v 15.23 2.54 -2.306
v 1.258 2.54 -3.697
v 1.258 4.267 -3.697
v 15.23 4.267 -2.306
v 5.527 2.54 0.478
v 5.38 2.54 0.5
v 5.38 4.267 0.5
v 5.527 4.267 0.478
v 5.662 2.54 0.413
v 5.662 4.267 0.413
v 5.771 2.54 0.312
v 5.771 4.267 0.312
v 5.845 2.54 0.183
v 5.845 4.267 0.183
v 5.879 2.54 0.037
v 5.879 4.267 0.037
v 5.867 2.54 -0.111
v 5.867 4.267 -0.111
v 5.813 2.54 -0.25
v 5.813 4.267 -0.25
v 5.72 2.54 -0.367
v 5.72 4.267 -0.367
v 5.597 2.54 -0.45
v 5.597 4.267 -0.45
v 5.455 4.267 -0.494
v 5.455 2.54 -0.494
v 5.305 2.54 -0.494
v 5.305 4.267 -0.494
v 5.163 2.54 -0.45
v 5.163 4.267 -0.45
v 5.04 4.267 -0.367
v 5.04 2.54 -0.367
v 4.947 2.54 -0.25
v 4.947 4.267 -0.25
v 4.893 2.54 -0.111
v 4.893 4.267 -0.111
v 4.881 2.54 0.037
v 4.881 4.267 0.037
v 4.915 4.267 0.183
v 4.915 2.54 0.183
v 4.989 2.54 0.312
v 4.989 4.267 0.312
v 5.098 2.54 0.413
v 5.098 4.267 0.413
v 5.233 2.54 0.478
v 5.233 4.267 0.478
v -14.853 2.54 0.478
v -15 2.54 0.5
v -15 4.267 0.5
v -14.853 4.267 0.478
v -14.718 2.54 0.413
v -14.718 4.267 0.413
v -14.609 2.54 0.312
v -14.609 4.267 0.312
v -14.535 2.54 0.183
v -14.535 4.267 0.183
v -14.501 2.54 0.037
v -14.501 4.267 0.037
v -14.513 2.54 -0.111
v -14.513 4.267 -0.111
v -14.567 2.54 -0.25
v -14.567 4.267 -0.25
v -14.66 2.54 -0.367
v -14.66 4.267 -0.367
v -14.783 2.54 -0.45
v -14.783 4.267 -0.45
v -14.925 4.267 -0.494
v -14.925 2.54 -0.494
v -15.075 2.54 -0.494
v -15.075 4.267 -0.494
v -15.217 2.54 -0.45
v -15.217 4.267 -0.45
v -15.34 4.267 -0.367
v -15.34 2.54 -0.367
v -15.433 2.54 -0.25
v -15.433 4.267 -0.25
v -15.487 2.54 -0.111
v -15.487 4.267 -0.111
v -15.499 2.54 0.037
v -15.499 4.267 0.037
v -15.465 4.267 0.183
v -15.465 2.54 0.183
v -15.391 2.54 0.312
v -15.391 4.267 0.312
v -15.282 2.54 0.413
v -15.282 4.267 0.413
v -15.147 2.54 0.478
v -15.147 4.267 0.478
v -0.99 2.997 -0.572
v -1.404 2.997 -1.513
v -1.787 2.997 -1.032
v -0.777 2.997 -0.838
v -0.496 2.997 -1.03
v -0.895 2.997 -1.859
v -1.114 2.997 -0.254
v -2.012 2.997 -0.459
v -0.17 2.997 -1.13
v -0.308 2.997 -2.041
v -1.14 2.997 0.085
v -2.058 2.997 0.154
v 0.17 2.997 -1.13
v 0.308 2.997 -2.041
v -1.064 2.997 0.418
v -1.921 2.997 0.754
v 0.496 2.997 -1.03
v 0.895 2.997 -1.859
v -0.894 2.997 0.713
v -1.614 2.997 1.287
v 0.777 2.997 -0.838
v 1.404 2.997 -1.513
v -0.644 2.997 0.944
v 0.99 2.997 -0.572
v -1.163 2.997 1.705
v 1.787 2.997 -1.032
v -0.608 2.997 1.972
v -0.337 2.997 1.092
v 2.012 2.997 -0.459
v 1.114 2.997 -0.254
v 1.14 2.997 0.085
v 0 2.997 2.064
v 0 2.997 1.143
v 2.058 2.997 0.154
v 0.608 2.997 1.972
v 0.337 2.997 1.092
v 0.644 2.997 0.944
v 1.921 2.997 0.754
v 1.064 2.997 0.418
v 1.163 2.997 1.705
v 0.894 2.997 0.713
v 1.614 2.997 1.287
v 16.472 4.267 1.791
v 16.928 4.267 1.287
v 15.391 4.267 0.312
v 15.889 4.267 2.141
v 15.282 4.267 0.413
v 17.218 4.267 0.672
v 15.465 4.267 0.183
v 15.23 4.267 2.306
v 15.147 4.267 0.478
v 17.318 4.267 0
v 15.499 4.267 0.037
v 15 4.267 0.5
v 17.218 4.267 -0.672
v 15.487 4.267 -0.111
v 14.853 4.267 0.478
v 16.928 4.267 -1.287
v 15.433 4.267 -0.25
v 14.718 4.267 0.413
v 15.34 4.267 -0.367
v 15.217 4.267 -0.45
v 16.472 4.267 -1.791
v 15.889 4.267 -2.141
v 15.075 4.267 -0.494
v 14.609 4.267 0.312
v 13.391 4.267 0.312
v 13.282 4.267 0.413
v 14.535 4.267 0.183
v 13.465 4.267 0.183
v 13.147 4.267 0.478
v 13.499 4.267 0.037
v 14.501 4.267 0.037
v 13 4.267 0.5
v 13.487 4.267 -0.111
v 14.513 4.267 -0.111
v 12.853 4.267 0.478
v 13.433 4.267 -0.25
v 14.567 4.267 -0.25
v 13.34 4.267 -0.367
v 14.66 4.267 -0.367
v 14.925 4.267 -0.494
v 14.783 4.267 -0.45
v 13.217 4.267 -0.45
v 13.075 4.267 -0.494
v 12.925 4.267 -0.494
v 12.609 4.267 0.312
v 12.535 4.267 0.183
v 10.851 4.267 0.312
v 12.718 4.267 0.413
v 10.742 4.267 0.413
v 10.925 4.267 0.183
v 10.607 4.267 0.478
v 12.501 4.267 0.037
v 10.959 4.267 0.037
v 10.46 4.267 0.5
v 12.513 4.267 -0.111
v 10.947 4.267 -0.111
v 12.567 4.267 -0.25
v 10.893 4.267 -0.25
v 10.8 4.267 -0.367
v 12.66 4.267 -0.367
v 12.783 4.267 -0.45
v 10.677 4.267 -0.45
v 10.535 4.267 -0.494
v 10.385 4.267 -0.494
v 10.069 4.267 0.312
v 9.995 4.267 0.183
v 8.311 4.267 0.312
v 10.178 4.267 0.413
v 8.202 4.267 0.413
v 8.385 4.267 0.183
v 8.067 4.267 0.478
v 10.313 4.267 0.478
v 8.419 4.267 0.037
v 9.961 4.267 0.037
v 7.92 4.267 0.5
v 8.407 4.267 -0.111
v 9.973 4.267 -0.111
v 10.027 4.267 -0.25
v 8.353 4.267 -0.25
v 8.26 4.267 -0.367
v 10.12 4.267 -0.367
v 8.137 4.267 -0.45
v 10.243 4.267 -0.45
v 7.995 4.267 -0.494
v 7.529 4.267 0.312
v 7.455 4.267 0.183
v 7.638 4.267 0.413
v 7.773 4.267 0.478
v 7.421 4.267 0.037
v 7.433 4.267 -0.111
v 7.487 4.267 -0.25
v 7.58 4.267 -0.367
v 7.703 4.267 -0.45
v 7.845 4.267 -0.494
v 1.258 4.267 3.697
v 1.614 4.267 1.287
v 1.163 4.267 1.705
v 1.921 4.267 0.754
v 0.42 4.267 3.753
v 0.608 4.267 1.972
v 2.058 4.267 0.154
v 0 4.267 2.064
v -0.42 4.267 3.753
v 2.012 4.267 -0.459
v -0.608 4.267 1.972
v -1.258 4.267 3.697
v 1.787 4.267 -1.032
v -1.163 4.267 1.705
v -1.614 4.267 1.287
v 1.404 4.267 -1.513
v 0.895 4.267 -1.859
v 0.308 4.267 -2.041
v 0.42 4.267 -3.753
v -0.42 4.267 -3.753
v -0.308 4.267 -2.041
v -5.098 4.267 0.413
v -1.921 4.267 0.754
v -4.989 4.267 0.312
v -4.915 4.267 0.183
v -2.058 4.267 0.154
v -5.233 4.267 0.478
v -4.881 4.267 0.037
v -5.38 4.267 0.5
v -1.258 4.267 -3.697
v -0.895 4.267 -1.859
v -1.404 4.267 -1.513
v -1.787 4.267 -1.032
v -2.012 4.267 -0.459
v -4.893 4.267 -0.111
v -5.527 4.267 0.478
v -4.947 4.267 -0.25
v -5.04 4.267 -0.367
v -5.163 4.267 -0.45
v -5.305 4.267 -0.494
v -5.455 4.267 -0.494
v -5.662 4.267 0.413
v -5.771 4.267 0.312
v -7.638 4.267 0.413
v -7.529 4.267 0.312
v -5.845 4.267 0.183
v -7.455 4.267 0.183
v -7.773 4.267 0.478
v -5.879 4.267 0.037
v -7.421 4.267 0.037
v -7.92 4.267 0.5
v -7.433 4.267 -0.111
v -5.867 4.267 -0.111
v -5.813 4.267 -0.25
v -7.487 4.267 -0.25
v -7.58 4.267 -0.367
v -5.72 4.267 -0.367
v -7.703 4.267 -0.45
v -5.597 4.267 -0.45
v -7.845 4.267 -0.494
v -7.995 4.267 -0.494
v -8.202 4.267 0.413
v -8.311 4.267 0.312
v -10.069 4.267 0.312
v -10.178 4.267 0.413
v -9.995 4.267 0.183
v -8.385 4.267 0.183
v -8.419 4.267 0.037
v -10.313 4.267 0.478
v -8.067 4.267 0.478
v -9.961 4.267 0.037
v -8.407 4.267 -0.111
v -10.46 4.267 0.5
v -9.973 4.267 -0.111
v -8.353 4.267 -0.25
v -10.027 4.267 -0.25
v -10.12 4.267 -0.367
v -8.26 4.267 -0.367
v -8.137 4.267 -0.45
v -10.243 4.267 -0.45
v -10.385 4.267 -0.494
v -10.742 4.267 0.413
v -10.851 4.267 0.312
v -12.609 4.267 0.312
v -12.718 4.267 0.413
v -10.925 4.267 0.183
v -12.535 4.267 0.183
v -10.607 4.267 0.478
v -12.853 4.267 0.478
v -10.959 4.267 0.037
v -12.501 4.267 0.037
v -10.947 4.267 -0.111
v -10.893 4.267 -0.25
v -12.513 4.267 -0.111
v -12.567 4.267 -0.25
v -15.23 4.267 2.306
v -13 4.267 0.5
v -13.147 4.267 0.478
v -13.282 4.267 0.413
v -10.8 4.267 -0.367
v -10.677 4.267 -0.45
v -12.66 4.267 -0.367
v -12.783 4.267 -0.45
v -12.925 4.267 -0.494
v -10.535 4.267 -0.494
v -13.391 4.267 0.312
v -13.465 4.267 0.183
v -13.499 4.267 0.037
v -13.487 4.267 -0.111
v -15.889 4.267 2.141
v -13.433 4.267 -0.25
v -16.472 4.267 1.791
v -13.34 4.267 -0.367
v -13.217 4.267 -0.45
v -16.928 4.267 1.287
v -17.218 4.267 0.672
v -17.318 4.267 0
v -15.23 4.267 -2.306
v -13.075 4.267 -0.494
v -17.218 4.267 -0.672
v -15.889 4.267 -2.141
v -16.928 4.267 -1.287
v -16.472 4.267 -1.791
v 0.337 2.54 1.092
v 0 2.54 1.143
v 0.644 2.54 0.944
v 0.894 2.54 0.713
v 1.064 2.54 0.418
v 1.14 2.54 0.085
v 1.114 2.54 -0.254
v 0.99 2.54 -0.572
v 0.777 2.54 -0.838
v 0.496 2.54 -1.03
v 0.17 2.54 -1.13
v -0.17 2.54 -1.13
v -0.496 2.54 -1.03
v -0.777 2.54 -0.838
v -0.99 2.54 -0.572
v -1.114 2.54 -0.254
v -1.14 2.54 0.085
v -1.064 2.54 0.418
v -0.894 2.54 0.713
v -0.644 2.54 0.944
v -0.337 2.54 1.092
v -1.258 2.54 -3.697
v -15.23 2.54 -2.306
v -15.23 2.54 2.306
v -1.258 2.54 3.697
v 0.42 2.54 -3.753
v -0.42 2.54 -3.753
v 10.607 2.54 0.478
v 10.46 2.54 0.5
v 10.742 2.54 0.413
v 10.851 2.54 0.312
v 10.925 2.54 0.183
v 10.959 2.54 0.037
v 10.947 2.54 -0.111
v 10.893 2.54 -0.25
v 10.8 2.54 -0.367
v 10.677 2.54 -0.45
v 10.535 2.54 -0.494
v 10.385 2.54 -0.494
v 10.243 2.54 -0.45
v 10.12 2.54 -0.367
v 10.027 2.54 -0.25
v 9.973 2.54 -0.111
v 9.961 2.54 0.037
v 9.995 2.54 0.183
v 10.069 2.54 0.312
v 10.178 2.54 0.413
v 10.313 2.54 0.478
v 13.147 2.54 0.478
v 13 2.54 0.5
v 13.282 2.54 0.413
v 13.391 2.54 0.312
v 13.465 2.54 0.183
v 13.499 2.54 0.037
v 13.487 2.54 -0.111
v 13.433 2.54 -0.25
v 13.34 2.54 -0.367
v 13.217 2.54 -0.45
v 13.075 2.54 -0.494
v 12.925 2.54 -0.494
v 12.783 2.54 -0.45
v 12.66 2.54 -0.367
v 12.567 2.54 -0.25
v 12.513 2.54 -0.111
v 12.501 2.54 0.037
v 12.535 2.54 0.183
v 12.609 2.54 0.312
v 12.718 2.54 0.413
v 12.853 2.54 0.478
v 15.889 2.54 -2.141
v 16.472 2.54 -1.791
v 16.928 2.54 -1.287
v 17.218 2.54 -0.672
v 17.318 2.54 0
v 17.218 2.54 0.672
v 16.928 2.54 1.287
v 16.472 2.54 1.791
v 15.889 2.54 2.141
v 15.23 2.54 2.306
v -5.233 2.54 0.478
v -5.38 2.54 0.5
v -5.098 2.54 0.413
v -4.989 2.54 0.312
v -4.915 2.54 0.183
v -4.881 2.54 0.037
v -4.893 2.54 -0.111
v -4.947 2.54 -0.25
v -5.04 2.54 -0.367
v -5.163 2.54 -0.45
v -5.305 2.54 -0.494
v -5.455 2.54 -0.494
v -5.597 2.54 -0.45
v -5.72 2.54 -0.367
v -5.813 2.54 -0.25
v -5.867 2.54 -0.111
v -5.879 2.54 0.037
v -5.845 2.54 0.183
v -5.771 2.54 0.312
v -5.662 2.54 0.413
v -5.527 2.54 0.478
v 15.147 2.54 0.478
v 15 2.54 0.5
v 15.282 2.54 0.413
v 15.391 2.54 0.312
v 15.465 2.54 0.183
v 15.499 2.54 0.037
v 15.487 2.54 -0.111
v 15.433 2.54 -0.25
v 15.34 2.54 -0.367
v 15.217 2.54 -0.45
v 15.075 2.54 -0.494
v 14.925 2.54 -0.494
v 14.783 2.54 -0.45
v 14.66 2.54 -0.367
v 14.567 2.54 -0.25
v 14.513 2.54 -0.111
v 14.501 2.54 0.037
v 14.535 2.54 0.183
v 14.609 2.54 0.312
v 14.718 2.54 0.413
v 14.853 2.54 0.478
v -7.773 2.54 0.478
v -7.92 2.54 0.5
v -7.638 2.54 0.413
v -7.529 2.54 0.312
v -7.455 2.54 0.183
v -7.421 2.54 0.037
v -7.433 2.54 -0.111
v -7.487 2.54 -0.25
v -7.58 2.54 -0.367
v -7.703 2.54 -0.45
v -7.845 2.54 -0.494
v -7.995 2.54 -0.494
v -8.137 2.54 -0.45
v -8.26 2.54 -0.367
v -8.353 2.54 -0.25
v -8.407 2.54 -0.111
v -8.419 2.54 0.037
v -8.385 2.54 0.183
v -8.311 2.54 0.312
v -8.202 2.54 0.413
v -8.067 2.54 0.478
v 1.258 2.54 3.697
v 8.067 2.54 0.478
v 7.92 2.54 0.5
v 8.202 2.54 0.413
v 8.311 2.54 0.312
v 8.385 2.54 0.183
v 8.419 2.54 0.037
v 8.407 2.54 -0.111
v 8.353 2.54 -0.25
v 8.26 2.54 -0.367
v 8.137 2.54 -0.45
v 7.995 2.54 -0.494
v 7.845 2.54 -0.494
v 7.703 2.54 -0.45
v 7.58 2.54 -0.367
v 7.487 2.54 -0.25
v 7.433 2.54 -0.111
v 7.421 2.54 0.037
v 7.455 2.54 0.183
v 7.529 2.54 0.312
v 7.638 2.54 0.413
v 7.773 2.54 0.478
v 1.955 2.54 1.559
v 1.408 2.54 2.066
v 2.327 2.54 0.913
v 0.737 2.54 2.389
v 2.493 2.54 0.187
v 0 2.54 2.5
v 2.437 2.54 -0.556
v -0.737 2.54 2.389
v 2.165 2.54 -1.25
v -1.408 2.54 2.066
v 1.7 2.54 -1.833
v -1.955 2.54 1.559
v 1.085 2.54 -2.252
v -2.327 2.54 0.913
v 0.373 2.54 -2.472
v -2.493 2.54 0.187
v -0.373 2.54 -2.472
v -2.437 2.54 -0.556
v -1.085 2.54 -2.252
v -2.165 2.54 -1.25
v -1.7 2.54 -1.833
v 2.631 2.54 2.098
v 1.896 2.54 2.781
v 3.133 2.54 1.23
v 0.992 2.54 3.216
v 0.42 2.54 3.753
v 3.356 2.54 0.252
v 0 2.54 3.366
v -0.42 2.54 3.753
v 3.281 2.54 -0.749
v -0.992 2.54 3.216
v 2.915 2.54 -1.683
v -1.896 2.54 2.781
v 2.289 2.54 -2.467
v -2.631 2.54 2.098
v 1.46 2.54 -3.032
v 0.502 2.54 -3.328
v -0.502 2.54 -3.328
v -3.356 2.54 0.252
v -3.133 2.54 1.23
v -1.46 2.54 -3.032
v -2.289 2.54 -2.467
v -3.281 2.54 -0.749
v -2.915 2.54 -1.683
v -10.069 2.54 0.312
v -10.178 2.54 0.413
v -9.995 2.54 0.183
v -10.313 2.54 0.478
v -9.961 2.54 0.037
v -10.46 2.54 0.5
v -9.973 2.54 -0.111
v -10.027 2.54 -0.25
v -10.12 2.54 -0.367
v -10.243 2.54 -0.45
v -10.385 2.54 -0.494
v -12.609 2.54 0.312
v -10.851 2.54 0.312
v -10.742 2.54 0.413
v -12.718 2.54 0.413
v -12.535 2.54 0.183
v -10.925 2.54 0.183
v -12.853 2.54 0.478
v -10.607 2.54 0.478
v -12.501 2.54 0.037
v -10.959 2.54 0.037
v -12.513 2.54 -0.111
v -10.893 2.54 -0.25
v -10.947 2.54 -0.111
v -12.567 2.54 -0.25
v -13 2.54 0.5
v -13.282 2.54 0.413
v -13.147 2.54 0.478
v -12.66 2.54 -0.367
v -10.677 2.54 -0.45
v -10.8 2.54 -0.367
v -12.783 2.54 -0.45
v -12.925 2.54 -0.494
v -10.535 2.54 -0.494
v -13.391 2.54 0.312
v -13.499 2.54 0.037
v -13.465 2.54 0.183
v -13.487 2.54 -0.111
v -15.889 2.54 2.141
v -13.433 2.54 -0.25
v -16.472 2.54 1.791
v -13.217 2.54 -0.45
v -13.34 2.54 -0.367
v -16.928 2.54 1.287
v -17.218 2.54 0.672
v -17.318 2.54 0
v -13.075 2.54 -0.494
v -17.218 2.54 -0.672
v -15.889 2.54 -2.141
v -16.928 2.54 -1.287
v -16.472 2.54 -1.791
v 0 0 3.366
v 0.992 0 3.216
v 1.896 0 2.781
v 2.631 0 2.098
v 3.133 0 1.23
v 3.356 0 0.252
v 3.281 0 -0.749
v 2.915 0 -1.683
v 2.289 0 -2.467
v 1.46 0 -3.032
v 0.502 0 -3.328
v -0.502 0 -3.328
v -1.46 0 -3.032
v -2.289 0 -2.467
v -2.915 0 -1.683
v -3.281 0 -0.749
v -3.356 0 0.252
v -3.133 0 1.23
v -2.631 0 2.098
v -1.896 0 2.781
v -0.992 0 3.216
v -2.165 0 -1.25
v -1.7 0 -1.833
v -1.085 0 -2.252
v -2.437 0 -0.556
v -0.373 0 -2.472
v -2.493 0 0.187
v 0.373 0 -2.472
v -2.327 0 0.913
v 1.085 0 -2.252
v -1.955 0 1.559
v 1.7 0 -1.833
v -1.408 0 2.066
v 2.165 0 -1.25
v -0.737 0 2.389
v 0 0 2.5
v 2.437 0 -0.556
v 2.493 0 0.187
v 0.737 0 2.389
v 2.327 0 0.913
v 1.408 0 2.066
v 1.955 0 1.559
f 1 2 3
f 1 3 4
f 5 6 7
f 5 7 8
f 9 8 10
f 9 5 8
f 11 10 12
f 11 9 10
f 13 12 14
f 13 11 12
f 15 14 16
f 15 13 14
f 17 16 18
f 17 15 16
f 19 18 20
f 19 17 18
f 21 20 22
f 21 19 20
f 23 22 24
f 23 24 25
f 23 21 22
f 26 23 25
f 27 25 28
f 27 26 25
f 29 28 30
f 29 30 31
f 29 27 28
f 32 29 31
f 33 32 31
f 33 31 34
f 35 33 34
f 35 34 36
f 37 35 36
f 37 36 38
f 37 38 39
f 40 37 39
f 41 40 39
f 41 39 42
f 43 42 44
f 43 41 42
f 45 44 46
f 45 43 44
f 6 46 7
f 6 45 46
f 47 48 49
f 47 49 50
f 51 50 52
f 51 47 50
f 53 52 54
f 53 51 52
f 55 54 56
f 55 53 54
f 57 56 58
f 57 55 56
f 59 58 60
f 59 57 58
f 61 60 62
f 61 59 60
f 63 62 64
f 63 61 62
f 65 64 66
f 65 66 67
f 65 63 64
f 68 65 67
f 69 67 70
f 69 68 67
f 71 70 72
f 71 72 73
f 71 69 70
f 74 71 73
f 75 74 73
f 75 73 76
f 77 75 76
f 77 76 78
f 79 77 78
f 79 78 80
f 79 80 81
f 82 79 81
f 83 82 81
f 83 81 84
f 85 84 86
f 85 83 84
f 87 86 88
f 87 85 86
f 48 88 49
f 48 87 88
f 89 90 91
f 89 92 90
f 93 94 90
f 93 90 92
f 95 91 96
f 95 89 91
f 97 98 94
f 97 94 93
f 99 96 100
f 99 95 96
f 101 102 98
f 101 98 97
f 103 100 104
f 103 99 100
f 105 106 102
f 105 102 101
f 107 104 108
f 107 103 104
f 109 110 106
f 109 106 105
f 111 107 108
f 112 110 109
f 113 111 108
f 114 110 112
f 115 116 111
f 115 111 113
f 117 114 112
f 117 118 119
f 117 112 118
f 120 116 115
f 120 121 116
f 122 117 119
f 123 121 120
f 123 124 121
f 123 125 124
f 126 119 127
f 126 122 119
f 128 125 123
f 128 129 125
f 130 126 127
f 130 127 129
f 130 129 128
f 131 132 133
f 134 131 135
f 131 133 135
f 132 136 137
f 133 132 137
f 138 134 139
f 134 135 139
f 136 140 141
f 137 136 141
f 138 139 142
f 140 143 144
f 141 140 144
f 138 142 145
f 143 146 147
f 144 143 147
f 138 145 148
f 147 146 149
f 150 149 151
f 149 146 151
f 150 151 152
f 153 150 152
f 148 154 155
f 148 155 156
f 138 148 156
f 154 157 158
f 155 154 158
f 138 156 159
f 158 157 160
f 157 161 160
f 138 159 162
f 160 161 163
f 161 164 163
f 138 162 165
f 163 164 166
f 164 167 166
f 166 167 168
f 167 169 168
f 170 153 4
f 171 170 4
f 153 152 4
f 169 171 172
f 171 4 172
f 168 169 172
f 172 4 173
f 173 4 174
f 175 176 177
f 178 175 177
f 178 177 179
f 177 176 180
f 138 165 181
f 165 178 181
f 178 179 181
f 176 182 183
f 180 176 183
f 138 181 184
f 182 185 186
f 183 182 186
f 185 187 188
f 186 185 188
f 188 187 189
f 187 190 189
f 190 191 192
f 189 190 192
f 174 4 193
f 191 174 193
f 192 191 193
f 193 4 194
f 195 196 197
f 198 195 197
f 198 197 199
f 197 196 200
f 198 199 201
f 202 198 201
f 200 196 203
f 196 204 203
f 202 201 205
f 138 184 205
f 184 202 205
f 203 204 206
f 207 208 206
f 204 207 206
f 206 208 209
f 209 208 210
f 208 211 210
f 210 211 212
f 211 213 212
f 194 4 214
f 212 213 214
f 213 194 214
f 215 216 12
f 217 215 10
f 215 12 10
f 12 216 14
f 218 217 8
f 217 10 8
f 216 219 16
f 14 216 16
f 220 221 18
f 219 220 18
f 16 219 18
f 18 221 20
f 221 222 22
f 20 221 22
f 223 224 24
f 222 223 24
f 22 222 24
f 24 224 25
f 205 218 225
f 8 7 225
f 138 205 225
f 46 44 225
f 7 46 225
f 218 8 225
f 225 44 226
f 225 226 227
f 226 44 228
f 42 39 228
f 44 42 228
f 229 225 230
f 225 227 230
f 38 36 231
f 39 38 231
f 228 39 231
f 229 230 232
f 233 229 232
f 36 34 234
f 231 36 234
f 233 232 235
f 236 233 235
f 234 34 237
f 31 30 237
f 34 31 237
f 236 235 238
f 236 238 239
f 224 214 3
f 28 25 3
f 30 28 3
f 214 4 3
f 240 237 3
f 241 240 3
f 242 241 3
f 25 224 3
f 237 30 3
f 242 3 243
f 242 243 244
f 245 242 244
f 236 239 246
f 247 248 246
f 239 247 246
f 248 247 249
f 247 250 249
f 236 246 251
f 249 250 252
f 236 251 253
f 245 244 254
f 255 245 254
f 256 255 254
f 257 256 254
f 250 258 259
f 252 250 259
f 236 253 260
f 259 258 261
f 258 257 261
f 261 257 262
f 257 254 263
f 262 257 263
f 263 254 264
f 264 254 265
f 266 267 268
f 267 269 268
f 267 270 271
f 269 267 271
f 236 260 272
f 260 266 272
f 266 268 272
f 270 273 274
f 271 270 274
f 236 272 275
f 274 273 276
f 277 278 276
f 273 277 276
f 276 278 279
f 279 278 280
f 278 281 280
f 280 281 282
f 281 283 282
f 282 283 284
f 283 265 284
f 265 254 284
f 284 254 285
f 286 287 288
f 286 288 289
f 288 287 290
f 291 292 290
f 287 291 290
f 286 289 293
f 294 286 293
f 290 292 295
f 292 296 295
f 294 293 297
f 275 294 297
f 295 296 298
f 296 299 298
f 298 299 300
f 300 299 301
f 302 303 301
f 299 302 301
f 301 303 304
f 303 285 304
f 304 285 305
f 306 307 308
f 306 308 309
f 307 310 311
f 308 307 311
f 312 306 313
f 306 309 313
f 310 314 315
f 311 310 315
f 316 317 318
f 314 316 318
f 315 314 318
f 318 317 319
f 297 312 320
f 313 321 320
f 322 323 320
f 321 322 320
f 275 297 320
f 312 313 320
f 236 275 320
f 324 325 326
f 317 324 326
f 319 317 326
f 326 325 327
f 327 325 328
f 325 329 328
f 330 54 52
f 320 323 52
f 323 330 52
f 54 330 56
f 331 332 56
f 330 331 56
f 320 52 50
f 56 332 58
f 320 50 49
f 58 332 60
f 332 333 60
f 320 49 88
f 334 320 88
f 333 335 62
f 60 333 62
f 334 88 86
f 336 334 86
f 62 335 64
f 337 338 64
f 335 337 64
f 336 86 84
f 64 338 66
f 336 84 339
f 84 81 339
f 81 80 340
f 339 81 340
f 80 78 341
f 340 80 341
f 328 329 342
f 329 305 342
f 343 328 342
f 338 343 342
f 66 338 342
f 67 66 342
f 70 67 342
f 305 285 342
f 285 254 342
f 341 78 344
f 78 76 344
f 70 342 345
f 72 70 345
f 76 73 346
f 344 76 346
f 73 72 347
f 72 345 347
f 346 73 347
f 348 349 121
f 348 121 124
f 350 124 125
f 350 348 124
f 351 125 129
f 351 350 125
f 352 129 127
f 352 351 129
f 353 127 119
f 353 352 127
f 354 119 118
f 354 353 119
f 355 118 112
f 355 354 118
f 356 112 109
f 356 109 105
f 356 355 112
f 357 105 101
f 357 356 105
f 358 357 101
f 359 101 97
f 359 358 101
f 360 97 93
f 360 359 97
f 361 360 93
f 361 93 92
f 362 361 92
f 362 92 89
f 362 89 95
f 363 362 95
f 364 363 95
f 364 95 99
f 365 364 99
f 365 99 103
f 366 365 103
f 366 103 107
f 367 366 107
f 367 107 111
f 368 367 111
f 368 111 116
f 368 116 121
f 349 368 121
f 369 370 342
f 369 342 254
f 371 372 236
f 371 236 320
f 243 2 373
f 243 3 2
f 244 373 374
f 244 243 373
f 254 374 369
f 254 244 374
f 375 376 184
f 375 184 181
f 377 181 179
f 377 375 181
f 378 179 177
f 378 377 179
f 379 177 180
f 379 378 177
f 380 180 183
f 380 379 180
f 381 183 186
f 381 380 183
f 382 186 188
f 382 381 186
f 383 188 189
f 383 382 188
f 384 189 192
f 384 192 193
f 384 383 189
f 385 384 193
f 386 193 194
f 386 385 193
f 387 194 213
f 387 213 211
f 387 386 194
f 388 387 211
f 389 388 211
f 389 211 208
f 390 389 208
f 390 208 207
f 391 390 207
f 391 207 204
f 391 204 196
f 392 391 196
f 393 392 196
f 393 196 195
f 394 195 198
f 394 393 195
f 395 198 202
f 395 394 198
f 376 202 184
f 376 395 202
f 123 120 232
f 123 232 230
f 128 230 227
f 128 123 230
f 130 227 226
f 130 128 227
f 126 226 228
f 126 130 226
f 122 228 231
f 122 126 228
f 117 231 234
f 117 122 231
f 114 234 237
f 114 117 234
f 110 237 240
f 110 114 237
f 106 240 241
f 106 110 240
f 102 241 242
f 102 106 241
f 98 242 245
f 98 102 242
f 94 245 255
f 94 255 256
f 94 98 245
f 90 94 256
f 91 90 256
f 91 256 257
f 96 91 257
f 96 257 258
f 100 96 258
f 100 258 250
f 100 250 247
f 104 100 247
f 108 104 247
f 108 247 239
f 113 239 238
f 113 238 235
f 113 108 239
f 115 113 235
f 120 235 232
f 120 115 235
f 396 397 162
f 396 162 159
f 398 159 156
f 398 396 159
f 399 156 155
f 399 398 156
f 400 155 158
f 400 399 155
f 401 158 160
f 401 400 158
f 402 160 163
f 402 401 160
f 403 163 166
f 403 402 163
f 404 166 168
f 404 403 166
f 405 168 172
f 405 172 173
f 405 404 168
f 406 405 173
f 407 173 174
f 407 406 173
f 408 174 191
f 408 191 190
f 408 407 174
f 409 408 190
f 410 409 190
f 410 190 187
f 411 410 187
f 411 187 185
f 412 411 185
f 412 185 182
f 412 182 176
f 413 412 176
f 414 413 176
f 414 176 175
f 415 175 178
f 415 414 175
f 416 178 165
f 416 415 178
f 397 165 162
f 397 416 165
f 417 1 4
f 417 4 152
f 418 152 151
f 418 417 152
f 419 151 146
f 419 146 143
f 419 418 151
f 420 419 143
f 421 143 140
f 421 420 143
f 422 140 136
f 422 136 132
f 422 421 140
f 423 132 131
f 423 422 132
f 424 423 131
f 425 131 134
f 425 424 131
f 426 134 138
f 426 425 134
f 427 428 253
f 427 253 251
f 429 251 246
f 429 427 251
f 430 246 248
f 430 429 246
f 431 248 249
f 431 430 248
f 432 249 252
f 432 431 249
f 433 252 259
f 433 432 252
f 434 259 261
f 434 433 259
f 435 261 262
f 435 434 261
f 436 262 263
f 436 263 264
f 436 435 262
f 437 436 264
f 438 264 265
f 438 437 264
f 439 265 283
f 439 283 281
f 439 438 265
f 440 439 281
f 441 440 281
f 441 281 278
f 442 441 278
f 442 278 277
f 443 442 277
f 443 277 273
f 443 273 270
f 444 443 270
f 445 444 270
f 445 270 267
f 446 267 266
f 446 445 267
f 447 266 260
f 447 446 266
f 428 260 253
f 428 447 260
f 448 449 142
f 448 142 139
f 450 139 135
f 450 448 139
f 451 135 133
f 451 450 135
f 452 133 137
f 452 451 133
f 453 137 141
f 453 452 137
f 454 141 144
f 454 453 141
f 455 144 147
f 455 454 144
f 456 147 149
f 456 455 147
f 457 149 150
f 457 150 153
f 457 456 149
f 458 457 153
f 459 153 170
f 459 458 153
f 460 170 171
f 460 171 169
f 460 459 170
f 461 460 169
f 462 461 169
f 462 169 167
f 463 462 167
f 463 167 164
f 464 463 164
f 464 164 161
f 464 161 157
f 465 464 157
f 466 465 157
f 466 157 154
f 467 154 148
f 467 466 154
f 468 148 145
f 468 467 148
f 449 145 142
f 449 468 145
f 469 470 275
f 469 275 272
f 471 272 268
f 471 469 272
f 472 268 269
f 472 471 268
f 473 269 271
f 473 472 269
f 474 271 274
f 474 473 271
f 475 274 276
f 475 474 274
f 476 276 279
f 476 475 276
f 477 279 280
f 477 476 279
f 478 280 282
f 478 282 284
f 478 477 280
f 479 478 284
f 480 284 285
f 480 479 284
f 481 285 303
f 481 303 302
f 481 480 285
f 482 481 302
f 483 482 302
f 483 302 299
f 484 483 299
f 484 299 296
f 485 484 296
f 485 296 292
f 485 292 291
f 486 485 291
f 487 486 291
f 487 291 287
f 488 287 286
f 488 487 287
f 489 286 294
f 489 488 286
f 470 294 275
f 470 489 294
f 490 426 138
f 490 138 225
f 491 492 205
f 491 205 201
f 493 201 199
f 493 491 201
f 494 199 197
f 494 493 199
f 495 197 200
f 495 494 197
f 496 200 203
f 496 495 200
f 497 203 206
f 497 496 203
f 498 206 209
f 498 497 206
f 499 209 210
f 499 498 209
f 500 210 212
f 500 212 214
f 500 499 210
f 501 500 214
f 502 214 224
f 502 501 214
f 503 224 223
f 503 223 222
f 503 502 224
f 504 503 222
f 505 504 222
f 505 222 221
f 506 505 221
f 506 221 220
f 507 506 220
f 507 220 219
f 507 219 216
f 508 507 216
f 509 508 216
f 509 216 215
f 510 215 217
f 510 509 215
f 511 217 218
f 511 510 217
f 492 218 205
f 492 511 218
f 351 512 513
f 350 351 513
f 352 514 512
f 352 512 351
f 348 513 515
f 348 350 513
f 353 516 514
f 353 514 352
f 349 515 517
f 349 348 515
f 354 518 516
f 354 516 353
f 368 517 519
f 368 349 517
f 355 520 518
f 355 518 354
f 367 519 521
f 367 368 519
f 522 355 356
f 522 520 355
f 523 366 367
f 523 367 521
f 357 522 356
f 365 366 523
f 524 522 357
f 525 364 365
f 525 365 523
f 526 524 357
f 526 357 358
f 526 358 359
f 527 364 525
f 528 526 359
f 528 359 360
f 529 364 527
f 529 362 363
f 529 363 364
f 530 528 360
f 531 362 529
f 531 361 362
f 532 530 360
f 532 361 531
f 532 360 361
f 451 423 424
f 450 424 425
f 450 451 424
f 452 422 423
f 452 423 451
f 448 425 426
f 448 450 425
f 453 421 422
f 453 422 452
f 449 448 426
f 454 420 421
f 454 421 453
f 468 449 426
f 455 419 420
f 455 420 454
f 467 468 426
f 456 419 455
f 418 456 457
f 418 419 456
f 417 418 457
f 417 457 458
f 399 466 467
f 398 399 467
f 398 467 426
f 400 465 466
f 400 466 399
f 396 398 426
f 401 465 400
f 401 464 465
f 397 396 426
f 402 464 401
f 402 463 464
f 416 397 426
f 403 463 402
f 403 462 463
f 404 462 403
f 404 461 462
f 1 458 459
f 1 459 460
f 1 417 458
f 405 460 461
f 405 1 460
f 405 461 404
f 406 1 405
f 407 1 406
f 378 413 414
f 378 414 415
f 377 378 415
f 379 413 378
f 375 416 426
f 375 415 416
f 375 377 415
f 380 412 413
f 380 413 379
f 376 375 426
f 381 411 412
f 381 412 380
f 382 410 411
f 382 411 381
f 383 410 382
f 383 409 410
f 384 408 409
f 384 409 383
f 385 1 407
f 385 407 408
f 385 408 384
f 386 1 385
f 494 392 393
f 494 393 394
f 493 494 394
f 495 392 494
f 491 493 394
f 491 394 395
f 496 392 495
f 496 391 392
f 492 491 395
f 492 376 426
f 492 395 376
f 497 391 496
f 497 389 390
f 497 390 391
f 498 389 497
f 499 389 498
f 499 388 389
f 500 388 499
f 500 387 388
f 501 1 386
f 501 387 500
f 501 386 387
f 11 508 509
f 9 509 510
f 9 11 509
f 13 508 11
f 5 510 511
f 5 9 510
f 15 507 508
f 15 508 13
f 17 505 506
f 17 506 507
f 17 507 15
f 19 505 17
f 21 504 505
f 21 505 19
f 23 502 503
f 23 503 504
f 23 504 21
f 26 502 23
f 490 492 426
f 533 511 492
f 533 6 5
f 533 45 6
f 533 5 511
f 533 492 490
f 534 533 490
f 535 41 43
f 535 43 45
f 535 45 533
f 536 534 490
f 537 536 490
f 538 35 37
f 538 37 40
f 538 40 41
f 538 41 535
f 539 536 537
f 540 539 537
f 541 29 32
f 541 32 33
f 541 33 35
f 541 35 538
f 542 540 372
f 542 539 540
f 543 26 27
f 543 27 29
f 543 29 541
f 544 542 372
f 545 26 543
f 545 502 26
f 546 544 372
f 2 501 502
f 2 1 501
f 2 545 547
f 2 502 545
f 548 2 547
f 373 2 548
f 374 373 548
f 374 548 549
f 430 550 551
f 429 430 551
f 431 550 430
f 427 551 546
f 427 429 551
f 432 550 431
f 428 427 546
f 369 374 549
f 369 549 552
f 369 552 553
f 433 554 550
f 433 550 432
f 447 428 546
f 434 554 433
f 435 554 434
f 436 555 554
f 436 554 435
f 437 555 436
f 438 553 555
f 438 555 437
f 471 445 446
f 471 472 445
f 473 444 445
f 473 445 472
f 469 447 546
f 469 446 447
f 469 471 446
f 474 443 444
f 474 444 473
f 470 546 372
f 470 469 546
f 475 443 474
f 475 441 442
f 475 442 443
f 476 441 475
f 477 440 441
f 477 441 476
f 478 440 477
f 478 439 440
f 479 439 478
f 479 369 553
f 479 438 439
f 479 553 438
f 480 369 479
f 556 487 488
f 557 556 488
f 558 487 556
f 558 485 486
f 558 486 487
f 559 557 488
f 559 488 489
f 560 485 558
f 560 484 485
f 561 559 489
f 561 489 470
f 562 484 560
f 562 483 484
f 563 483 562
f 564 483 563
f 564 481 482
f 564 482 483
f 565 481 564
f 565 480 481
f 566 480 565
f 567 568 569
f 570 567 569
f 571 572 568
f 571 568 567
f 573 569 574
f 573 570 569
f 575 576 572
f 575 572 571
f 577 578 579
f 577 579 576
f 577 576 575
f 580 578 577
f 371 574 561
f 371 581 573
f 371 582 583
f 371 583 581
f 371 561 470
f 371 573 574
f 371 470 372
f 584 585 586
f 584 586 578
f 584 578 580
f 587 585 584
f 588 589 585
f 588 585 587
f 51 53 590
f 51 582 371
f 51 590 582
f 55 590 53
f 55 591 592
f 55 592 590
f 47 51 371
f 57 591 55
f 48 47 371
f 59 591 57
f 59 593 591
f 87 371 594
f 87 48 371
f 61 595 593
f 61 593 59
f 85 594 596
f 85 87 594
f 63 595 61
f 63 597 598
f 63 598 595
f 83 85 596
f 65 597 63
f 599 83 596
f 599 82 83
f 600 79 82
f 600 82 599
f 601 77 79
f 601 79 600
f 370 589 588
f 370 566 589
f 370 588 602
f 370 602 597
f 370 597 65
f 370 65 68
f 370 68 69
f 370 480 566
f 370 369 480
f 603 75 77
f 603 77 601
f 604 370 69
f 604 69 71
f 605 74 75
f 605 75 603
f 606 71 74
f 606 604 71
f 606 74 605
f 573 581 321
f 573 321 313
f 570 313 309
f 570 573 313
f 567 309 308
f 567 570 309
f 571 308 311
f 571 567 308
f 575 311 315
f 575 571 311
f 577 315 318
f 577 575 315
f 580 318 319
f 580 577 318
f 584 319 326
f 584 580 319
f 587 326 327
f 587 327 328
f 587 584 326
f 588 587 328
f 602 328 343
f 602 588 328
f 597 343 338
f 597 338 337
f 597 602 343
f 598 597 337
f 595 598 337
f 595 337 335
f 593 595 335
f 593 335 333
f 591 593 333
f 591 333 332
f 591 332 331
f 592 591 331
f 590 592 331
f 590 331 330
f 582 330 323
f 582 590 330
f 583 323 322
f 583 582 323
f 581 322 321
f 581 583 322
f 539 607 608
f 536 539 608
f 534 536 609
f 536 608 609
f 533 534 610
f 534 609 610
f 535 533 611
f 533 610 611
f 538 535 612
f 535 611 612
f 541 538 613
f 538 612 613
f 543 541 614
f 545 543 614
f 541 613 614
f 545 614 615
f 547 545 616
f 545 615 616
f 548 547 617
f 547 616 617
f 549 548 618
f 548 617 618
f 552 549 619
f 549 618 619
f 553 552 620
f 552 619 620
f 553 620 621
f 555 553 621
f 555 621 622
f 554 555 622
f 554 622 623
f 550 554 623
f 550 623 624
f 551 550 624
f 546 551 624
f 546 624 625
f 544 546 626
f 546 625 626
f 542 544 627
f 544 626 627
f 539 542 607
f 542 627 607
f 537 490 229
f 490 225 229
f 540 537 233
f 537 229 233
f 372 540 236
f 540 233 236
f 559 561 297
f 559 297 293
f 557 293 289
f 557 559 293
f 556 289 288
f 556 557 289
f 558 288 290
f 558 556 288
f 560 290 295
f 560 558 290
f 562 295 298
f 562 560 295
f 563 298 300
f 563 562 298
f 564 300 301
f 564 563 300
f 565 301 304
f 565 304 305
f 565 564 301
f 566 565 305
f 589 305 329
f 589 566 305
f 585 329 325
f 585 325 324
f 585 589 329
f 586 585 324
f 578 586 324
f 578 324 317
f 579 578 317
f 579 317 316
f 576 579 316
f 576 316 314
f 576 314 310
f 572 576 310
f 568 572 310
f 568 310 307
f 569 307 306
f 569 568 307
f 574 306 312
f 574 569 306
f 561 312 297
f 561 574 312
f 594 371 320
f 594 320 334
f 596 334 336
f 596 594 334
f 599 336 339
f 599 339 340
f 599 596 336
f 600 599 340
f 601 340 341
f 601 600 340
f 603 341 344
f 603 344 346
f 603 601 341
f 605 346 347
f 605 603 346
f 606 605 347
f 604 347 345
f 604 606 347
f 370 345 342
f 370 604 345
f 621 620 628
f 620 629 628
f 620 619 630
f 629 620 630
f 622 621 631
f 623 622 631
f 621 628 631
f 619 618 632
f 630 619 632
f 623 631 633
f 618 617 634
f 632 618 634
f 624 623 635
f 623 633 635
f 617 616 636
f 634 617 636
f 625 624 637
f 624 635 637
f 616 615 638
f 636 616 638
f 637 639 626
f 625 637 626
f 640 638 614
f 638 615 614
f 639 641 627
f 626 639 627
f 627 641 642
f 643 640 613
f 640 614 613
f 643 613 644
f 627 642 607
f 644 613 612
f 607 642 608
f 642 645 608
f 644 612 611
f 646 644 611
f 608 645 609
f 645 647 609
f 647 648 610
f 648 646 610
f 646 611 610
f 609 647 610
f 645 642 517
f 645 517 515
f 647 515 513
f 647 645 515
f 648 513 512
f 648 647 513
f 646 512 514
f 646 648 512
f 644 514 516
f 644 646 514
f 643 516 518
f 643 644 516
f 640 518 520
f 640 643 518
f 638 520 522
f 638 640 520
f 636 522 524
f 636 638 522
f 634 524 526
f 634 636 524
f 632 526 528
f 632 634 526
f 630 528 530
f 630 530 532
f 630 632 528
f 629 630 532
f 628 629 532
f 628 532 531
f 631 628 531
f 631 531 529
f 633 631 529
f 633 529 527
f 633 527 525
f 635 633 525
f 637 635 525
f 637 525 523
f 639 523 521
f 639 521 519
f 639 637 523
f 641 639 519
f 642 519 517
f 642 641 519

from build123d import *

# Parameters (mm, degrees)
SKETCH1_R           = 3.3655
SKETCH1_R_2         = 2.5
BOSS_EXTRUDE1_DEPTH = 2.54
SKETCH2_R           = 0.5
SKETCH2_R_2         = 1.143
BOSS_EXTRUDE2_DEPTH = 1.7272
FILLET1_R           = 12.7
CUT_EXTRUDE1_START  = -1.27
SKETCH3_R           = 2.06375
SKETCH3_R_2         = 1.143
CUT_EXTRUDE1_DEPTH  = 1.27


with BuildPart() as part:
    # Sketch1 → Boss-Extrude1 (new body)
    with BuildSketch(Plane(origin=(0, 0, 0), x_dir=(1, 0, 0), z_dir=(0, 1, 0))):
        with Locations(Location((0, 0, 0), (0, 0, 270))):
            Circle(SKETCH1_R)
        with Locations(Location((0, 0, 0), (0, 0, 270))):
            Circle(SKETCH1_R_2, mode=Mode.SUBTRACT)
    extrude(amount=BOSS_EXTRUDE1_DEPTH)

    # Sketch2 → Boss-Extrude2 (add)
    with BuildSketch(Plane(origin=(0, 2.54, 0), x_dir=(1, 0, 0), z_dir=(0, 1, 0))):
        with BuildLine():
            Line((0, 3.8227), (15.229633673, 2.30634634))
            ThreePointArc((15.229633673, 2.30634634), (17.31775, 0), (15.229633673, -2.30634634))
            Line((15.229633673, -2.30634634), (0, -3.8227))
            Line((0, -3.8227), (-15.229633673, -2.30634634))
            ThreePointArc((-15.229633673, -2.30634634), (-17.31775, 0), (-15.229633673, 2.30634634))
            Line((-15.229633673, 2.30634634), (0, 3.8227))
        make_face()
        with Locations(Location((-10.46, 0, 0), (0, 0, 270))):
            Circle(SKETCH2_R, mode=Mode.SUBTRACT)
        with Locations(Location((-7.92, 0, 0), (0, 0, 270))):
            Circle(SKETCH2_R, mode=Mode.SUBTRACT)
        with Locations(Location((-5.38, 0, 0), (0, 0, 270))):
            Circle(SKETCH2_R, mode=Mode.SUBTRACT)
        with Locations(Location((15, 0, 0), (0, 0, 270))):
            Circle(SKETCH2_R, mode=Mode.SUBTRACT)
        with Locations(Location((5.38, 0, 0), (0, 0, 270))):
            Circle(SKETCH2_R, mode=Mode.SUBTRACT)
        with Locations(Location((7.92, 0, 0), (0, 0, 270))):
            Circle(SKETCH2_R, mode=Mode.SUBTRACT)
        with Locations(Location((-13, 0, 0), (0, 0, 270))):
            Circle(SKETCH2_R, mode=Mode.SUBTRACT)
        with Locations(Location((-15, 0, 0), (0, 0, 270))):
            Circle(SKETCH2_R, mode=Mode.SUBTRACT)
        with Locations(Location((0, 0, 0), (0, 0, 270))):
            Circle(SKETCH2_R_2, mode=Mode.SUBTRACT)
        with Locations(Location((10.46, 0, 0), (0, 0, 270))):
            Circle(SKETCH2_R, mode=Mode.SUBTRACT)
        with Locations(Location((13, 0, 0), (0, 0, 270))):
            Circle(SKETCH2_R, mode=Mode.SUBTRACT)
    extrude(amount=BOSS_EXTRUDE2_DEPTH)

    # Fillet1
    fillet1_edges = [part.edges().sort_by_distance(p)[0] for p in [
        (0, 3.4036, 3.8227),
        (0, 3.4036, -3.8227),
    ]]
    fillet(fillet1_edges, radius=FILLET1_R)

    # Sketch3 → Cut-Extrude1 (cut)
    with BuildSketch(Plane(origin=(0, 4.2672, 0), x_dir=(1, 0, 0), z_dir=(0, 1, 0)).offset(CUT_EXTRUDE1_START)):
        with Locations(Location((0, 0, 0), (0, 0, 270))):
            Circle(SKETCH3_R)
        with Locations(Location((0, 0, 0), (0, 0, 270))):
            Circle(SKETCH3_R_2, mode=Mode.SUBTRACT)
    extrude(amount=CUT_EXTRUDE1_DEPTH, mode=Mode.SUBTRACT)


solid = part.part
